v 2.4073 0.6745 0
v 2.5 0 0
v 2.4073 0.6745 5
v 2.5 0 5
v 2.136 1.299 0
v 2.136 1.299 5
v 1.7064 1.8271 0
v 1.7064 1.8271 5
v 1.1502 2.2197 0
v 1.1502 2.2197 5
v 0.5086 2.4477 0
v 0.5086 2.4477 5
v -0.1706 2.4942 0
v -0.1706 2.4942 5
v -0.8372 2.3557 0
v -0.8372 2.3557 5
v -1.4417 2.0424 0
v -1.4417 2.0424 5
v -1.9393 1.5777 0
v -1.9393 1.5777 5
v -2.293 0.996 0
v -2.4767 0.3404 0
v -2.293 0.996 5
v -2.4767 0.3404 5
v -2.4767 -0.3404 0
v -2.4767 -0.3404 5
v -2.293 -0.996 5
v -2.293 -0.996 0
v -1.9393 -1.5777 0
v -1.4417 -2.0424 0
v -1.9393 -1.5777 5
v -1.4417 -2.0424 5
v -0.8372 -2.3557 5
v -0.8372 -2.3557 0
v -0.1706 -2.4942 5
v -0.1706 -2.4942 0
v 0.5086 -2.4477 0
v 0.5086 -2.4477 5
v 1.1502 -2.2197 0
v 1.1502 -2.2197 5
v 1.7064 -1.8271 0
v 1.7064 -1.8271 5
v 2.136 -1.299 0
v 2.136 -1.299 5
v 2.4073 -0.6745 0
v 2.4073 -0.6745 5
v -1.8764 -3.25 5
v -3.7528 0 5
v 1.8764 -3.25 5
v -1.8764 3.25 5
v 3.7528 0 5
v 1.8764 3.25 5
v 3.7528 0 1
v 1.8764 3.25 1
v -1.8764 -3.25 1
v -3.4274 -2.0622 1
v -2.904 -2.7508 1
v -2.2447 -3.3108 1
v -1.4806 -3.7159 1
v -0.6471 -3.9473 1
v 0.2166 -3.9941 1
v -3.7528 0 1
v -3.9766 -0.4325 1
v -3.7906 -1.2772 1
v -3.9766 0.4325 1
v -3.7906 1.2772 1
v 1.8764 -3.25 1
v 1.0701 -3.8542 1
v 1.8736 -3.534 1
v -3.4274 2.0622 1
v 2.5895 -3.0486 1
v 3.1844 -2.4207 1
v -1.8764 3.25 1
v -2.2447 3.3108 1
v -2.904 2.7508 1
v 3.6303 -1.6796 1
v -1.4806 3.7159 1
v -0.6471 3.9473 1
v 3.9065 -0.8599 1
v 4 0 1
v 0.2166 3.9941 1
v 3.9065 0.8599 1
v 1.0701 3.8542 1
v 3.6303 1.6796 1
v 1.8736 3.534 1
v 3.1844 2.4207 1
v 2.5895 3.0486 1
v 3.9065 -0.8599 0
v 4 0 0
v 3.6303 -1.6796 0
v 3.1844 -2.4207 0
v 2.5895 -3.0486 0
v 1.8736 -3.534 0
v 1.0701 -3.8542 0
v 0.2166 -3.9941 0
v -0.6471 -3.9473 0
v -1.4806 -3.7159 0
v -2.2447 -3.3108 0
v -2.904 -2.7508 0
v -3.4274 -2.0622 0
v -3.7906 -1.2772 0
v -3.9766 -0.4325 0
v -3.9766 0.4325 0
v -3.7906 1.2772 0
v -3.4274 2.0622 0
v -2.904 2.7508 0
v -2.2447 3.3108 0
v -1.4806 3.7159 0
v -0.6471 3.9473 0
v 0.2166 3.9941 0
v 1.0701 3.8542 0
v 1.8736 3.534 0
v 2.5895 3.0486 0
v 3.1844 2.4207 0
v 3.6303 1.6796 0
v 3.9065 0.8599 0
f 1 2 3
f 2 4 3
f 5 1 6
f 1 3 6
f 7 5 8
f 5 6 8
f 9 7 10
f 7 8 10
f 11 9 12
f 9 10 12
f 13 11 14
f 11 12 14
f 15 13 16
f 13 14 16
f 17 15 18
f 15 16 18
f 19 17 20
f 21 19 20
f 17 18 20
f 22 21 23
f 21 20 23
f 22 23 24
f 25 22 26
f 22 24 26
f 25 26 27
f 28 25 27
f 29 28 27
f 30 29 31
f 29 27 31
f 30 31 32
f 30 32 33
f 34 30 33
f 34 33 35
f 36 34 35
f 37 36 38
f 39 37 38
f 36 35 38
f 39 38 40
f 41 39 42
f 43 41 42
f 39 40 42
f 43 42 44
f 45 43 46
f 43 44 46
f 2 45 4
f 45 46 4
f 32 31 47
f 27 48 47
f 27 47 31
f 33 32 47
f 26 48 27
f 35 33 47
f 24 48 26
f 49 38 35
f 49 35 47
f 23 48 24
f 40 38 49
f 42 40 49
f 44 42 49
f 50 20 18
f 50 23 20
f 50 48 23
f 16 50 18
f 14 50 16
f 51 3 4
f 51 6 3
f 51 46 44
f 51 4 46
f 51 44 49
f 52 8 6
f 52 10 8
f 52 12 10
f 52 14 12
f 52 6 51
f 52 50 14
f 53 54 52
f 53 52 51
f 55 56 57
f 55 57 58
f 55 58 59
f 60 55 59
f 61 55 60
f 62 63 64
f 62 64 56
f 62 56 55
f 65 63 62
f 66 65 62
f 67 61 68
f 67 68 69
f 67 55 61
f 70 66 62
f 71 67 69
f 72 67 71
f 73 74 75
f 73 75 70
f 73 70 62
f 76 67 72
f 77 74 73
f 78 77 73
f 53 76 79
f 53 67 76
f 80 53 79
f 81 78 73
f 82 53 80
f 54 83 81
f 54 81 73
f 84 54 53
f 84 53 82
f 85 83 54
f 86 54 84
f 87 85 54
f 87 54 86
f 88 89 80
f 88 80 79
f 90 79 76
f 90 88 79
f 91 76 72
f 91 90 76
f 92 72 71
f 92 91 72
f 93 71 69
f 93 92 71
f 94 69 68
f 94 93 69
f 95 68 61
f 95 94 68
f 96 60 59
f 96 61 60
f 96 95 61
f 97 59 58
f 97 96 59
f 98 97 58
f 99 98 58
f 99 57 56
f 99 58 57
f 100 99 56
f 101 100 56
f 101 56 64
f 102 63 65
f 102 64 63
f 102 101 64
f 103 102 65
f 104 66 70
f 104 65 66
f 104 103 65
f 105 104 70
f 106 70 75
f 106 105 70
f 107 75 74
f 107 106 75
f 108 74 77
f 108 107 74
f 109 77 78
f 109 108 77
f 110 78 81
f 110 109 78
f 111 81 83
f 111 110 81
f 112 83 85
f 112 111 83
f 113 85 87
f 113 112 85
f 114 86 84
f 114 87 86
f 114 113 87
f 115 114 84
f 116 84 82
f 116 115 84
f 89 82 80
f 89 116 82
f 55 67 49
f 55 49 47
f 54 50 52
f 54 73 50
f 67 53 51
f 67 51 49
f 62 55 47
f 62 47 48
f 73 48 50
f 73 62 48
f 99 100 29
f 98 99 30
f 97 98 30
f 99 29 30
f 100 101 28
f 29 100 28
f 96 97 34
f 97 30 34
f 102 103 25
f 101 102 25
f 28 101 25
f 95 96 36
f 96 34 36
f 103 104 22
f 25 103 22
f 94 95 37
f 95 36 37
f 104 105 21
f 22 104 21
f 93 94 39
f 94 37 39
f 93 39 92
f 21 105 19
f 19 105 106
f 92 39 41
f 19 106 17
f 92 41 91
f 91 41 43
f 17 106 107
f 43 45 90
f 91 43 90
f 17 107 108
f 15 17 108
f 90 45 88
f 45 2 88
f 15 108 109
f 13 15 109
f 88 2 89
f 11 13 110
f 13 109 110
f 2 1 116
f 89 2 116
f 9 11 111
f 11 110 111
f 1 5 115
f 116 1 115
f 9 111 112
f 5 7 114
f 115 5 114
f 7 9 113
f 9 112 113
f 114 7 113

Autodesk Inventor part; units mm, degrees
ref_plane "YZ Plane" through (0, 0, 0) normal (1, 0, 0) x (0, 1, 0)
ref_plane "XZ Plane" through (0, 0, 0) normal (0, 1, 0) x (-1, 0, 0)
ref_plane "XY Plane" through (0, 0, 0) normal (0, 0, 1) x (1, 0, 0)
sketch "草图1" plane through (0, 0, 0) normal (0, 0, 1) x (1, 0, 0)
  circle A0 centre (0, 0) radius 4
  dimension "d0" = 8
extrude "拉伸1" add sketch "草图1" along normal blind 1
sketch "草图2" plane through (0, 0, 1) normal (0, 0, 1) x (1, 0, 0)
  line L0 (1.8764, -3.25) -> (-1.8764, -3.25)
  line L1 (-1.8764, -3.25) -> (-3.7528, 0)
  line L2 (-3.7528, 0) -> (-1.8764, 3.25)
  line L3 (-1.8764, 3.25) -> (1.8764, 3.25)
  line L4 (1.8764, 3.25) -> (3.7528, 0)
  line L5 (3.7528, 0) -> (1.8764, -3.25)
  line L6 (0, 0) -> (0, 3.25)
  dimension "d3" = 6.5
extrude "拉伸2" add sketch "草图2" along normal blind 4
sketch "草图3" plane through (0, 0, 5) normal (0, 0, 1) x (1, 0, 0)
  circle A0 centre (0, 0) radius 2.5
  dimension "d6" = 5
extrude "拉伸3" cut sketch "草图3" against normal through all
thread "螺纹1" size "M5x0.8" class "6H" standard "ANSI Metric M Profile" full length
properties part number "分离水箱固定螺帽"
